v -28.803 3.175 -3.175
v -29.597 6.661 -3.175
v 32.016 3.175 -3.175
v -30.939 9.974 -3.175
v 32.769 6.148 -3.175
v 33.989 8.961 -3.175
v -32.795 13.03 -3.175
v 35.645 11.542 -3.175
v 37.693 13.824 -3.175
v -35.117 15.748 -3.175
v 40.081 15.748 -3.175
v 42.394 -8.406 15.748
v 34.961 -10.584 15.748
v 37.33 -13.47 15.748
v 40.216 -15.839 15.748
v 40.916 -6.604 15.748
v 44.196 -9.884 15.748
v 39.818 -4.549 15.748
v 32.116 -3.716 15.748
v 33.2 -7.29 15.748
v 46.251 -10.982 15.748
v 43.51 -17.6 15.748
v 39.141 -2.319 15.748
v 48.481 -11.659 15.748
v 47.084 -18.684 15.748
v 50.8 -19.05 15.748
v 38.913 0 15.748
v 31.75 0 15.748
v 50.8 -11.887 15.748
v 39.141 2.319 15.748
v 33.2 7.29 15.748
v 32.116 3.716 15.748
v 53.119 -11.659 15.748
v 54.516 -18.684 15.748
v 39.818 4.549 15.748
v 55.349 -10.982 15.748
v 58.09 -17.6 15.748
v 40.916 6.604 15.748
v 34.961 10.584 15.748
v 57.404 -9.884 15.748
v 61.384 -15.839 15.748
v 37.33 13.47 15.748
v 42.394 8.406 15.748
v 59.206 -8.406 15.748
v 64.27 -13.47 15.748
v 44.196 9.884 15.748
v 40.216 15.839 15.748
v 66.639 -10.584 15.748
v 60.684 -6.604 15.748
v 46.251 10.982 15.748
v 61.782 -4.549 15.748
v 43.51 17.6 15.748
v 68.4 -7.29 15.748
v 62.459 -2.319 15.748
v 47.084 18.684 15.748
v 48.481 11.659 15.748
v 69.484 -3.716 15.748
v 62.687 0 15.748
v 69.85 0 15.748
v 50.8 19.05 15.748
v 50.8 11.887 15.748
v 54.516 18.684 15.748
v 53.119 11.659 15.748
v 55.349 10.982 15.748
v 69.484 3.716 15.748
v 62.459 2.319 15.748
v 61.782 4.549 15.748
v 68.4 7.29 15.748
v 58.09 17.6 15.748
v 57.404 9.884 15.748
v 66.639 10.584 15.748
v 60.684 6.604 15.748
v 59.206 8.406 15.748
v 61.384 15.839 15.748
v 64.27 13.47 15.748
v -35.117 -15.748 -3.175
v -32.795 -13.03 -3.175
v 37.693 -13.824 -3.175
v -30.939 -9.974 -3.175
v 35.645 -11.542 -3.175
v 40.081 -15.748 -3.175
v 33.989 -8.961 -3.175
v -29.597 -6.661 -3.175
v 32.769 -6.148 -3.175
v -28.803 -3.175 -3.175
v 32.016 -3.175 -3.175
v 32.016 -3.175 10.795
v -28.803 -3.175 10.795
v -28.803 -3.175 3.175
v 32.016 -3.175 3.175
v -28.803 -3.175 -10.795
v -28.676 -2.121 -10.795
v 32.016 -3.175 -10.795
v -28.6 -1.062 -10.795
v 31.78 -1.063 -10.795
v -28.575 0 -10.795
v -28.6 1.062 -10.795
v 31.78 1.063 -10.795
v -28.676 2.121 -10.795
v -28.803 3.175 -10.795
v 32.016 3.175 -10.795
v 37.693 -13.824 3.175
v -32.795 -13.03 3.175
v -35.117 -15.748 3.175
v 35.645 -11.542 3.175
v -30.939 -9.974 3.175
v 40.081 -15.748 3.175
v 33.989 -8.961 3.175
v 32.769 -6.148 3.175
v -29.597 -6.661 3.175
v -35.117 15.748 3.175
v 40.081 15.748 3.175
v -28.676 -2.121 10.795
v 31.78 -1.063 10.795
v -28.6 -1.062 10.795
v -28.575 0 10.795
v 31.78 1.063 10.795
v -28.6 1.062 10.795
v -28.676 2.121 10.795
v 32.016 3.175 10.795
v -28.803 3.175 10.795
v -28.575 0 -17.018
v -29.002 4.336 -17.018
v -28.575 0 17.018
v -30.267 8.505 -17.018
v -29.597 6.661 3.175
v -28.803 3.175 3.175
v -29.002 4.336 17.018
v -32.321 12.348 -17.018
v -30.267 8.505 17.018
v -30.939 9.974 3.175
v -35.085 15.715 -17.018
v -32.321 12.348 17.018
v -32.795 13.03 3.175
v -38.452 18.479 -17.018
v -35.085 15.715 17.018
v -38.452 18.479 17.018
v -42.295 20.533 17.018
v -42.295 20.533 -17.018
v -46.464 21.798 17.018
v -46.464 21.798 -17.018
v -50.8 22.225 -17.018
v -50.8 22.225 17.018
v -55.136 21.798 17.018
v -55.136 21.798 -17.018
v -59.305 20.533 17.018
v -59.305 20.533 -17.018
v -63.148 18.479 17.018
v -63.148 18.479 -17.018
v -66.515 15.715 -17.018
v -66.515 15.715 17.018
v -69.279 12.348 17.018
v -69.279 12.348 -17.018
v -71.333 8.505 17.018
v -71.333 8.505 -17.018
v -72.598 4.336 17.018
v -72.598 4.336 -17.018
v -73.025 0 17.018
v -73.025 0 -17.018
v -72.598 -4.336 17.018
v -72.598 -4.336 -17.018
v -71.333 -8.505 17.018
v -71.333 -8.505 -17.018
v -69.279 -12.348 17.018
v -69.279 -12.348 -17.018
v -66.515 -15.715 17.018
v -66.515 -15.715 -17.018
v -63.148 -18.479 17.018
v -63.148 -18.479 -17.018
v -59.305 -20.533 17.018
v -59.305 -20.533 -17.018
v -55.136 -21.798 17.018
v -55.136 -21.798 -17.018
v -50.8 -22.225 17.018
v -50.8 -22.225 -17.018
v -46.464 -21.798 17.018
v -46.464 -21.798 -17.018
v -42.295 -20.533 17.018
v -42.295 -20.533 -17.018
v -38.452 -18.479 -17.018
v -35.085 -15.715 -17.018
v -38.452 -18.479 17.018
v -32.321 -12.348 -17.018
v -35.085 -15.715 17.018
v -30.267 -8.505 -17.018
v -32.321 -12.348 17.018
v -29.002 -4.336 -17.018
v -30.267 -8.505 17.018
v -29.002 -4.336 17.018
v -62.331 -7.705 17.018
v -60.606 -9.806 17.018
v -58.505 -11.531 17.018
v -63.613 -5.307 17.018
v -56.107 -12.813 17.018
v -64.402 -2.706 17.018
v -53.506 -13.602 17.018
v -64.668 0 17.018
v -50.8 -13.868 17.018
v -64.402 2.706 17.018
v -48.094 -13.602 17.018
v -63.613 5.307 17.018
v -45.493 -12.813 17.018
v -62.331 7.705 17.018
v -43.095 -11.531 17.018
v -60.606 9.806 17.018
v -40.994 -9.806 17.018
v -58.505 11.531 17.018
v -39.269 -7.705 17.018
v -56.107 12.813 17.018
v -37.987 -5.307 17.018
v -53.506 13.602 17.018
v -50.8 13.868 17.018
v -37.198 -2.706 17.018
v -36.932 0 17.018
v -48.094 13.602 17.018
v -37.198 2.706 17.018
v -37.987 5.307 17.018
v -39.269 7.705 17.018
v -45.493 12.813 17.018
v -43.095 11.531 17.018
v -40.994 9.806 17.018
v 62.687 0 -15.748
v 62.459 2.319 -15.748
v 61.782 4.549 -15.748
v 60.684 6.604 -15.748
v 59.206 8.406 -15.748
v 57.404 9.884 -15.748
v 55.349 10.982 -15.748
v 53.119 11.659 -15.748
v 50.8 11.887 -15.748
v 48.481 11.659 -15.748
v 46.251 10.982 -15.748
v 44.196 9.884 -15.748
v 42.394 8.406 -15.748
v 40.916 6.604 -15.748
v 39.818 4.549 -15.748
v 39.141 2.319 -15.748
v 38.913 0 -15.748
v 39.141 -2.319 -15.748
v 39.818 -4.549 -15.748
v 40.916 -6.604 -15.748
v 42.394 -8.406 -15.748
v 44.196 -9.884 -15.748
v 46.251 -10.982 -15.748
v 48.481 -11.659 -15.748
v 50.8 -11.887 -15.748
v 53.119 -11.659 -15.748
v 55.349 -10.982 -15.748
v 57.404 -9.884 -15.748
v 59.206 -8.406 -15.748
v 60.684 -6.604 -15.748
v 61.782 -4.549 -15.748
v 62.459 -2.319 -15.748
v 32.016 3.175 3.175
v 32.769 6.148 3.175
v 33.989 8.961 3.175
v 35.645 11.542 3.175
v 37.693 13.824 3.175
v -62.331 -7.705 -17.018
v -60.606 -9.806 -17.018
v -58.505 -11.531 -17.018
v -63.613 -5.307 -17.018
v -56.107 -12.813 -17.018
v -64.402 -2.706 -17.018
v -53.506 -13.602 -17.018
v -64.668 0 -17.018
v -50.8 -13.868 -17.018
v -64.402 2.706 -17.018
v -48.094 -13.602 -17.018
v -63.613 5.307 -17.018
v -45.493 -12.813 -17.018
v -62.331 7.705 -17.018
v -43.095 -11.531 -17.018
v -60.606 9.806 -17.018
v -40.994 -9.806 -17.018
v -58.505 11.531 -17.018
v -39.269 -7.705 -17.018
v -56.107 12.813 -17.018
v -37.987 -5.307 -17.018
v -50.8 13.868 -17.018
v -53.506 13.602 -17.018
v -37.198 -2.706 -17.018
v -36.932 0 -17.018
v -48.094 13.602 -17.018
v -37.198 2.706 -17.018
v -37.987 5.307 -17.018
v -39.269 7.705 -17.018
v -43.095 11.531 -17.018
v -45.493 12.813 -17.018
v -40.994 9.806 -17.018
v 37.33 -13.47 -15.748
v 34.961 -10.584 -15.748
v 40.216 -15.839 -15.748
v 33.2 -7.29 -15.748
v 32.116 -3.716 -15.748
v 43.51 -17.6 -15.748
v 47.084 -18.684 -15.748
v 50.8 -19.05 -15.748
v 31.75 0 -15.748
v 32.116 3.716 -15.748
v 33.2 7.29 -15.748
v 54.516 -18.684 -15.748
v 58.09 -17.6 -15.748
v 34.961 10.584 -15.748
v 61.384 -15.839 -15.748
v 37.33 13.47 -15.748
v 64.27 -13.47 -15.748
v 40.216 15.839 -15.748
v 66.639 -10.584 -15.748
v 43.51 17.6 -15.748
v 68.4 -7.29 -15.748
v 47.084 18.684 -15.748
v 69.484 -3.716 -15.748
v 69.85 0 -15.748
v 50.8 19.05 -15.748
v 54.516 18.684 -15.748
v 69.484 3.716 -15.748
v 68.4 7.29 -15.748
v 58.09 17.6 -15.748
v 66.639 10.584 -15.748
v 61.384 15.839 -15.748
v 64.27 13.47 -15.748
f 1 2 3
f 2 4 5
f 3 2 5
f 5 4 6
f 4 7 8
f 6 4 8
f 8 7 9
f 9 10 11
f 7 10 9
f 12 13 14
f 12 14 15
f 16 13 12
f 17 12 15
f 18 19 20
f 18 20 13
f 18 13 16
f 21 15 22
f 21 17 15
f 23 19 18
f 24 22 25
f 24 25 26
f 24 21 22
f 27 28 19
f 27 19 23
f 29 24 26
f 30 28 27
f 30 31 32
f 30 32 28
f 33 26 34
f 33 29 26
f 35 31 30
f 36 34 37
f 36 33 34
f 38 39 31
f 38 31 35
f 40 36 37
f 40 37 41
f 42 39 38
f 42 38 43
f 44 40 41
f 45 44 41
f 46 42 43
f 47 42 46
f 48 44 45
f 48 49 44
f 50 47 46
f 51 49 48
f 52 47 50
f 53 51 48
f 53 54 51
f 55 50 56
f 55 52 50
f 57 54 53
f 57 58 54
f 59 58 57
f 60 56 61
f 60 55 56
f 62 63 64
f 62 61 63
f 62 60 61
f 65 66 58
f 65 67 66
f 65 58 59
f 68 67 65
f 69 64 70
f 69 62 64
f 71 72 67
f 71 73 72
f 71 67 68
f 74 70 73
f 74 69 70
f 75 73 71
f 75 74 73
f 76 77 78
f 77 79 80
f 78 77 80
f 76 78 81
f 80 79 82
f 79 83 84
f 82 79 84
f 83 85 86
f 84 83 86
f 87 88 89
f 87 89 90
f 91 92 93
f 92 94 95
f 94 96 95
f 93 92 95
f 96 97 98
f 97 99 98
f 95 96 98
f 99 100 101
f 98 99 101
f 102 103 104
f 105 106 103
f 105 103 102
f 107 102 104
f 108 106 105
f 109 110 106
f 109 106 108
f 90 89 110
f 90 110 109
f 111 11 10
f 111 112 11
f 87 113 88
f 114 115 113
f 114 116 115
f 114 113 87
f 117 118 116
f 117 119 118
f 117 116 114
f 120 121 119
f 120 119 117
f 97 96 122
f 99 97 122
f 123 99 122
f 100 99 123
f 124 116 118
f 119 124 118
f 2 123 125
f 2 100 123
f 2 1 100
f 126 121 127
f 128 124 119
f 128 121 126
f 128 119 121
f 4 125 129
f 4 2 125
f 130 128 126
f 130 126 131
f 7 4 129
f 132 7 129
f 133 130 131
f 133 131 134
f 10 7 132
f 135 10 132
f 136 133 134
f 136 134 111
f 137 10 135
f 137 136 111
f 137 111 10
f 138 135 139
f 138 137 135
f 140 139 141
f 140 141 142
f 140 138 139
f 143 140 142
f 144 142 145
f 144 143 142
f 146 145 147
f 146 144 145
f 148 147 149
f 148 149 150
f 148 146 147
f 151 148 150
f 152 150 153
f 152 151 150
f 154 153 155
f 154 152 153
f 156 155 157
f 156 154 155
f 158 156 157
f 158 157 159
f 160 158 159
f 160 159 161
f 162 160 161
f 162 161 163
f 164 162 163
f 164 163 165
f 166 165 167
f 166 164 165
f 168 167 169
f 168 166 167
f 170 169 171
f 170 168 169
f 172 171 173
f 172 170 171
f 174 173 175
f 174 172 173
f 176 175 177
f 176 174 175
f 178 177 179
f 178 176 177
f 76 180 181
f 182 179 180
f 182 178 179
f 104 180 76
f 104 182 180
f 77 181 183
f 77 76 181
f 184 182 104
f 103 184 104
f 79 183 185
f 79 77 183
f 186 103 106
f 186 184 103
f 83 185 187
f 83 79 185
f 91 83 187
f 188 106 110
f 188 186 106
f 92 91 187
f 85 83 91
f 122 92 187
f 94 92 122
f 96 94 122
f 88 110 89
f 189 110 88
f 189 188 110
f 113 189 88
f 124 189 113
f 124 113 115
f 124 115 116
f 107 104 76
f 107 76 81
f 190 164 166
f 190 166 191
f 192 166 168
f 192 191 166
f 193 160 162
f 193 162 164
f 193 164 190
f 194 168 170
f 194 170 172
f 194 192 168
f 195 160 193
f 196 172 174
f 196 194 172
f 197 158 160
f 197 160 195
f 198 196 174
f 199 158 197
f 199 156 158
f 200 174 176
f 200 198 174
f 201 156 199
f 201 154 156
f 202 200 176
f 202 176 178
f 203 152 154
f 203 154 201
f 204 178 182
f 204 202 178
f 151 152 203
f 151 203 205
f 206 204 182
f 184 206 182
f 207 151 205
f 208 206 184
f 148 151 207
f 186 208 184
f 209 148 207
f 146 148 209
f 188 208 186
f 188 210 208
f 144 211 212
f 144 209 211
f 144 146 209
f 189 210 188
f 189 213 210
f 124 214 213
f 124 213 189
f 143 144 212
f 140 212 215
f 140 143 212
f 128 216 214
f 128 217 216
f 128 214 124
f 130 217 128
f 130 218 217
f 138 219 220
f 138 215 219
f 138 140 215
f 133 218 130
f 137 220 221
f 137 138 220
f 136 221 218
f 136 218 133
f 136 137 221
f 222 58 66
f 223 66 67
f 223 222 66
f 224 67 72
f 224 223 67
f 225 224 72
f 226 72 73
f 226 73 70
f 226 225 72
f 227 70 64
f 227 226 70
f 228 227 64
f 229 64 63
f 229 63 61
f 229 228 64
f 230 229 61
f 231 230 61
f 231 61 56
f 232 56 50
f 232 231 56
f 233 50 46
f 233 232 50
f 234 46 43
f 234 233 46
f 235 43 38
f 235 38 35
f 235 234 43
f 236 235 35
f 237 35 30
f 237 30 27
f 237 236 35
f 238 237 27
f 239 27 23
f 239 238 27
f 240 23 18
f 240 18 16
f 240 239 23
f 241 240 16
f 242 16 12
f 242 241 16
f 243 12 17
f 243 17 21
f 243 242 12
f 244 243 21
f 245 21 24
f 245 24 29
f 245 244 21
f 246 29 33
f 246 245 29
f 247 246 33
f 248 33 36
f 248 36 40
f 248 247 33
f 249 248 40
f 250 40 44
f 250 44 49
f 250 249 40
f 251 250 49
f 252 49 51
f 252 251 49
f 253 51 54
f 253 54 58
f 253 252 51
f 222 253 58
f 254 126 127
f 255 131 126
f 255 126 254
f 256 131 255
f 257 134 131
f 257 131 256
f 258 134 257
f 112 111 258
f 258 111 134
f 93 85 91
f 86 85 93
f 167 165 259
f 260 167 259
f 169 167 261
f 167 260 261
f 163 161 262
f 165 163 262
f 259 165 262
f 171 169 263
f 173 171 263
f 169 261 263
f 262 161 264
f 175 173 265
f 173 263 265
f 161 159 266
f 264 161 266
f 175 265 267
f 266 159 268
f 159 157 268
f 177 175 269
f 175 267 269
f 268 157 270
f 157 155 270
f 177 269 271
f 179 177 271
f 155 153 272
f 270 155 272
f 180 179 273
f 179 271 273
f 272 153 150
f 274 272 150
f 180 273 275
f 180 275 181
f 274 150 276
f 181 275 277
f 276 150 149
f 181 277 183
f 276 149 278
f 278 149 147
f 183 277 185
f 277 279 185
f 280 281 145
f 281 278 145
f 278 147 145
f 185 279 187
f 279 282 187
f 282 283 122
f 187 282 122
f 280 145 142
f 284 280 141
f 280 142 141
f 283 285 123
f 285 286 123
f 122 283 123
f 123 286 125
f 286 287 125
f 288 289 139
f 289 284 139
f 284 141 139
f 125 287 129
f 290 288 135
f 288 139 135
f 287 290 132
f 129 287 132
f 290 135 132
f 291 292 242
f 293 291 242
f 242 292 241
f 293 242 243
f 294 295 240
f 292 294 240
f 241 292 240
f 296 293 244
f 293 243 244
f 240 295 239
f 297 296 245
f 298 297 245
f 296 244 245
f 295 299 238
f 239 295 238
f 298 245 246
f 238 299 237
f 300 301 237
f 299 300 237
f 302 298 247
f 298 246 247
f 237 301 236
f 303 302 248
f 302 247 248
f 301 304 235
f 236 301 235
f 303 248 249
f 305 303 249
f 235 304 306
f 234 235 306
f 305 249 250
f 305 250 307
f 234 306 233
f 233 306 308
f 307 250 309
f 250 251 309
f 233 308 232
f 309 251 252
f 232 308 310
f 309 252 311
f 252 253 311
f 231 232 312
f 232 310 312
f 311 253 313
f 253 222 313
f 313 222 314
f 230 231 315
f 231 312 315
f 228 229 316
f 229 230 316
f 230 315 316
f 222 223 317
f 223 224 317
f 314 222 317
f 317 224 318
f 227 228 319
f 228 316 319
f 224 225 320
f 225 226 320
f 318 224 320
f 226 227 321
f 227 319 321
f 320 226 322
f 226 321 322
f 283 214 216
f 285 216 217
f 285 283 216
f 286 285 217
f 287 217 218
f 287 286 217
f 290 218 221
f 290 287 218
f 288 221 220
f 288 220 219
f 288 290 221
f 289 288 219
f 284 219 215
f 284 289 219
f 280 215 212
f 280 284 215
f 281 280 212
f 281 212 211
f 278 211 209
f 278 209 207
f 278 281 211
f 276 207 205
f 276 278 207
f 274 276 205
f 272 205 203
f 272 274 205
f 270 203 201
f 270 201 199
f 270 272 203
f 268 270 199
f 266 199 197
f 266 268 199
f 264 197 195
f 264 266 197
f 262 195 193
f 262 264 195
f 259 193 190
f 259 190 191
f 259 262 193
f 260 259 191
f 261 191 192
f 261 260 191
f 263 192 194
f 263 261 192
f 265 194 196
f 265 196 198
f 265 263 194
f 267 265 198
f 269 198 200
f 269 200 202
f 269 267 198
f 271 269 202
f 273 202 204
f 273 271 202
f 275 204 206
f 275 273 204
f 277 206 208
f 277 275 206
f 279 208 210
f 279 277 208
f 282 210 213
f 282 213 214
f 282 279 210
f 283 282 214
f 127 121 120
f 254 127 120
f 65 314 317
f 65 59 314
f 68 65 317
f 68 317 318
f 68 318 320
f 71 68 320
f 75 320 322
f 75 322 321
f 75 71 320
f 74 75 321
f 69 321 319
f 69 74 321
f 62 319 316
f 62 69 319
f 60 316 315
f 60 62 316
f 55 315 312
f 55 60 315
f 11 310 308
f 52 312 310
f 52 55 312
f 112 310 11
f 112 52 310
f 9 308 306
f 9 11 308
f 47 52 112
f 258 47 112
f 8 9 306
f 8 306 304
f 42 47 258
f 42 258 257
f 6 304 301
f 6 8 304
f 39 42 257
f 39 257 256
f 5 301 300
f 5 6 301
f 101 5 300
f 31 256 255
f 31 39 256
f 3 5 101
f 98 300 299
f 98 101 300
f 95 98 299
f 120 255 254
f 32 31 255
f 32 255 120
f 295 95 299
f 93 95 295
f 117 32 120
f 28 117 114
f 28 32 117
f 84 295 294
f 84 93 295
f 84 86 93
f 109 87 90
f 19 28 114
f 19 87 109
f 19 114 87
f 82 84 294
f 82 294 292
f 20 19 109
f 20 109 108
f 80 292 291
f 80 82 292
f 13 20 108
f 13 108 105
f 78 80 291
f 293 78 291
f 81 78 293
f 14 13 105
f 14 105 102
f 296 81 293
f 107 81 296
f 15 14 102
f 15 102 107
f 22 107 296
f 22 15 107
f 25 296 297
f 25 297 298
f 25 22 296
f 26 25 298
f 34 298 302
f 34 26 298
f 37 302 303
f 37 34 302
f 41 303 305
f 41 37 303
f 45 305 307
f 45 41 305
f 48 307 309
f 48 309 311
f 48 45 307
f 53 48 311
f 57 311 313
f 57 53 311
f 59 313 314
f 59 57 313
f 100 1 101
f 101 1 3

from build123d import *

# Parameters (mm, degrees)
SKETCH1_R           = 13.8684
BOSS_EXTRUDE1_DEPTH = 17.018
SKETCH1_3_R         = 11.8872
BOSS_EXTRUDE2_DEPTH = 15.748
BOSS_EXTRUDE3_DEPTH = 3.175
SKETCH3_W           = 68.65982448
SKETCH3_H           = 6.35
BOSS_EXTRUDE5_DEPTH = 10.795


with BuildPart() as part:
    # Sketch1 → Boss-Extrude1 (new, symmetric)
    with BuildSketch(Plane.XY):
        with BuildLine():
            ThreePointArc((-28.575, 0), (-30.275606021, 8.526422275), (-35.117171142, 15.748))
            ThreePointArc((-35.117171142, 15.748), (-73.025, 0), (-35.117171142, -15.748))
            ThreePointArc((-35.117171142, -15.748), (-30.275606021, -8.526422275), (-28.575, 0))
        make_face()
        with Locations((-50.8, 0)):
            Circle(SKETCH1_R, mode=Mode.SUBTRACT)
    extrude(amount=BOSS_EXTRUDE1_DEPTH, both=True)



with BuildPart() as body_2:
    # Sketch1<3> → Boss-Extrude2 (new, symmetric)
    with BuildSketch(Plane.XY):
        with BuildLine():
            ThreePointArc((69.85, 0), (59.707866953, 16.839014411), (40.080718494, 15.748))
            ThreePointArc((40.080718494, 15.748), (31.75, 0), (40.080718494, -15.748))
            ThreePointArc((40.080718494, -15.748), (59.707866953, -16.839014411), (69.85, 0))
        make_face()
        with Locations((50.8, 0)):
            Circle(SKETCH1_3_R, mode=Mode.SUBTRACT)
    extrude(amount=BOSS_EXTRUDE2_DEPTH, both=True)


with BuildPart() as part_1:
    add(part.part)

    add(body_2.part)  # Boss-Extrude3 merges body 2
    # Sketch1<4> → Boss-Extrude3 (add, symmetric)
    with BuildSketch(Plane.XY):
        with BuildLine():
            Line((40.080718494, 15.748), (-35.117171142, 15.748))
            ThreePointArc((-35.117171142, 15.748), (-30.275606021, 8.526422275), (-28.575, 0))
            ThreePointArc((-28.575, 0), (-30.275606021, -8.526422275), (-35.117171142, -15.748))
            Line((-35.117171142, -15.748), (40.080718494, -15.748))
            ThreePointArc((40.080718494, -15.748), (31.75, 0), (40.080718494, 15.748))
        make_face()
    extrude(amount=BOSS_EXTRUDE3_DEPTH, both=True)

    # Sketch3 → Boss-Extrude5 (add, symmetric)
    with BuildSketch(Plane.XY):
        Rectangle(SKETCH3_W, SKETCH3_H)
    extrude(amount=BOSS_EXTRUDE5_DEPTH, both=True)


solid = part_1.part
